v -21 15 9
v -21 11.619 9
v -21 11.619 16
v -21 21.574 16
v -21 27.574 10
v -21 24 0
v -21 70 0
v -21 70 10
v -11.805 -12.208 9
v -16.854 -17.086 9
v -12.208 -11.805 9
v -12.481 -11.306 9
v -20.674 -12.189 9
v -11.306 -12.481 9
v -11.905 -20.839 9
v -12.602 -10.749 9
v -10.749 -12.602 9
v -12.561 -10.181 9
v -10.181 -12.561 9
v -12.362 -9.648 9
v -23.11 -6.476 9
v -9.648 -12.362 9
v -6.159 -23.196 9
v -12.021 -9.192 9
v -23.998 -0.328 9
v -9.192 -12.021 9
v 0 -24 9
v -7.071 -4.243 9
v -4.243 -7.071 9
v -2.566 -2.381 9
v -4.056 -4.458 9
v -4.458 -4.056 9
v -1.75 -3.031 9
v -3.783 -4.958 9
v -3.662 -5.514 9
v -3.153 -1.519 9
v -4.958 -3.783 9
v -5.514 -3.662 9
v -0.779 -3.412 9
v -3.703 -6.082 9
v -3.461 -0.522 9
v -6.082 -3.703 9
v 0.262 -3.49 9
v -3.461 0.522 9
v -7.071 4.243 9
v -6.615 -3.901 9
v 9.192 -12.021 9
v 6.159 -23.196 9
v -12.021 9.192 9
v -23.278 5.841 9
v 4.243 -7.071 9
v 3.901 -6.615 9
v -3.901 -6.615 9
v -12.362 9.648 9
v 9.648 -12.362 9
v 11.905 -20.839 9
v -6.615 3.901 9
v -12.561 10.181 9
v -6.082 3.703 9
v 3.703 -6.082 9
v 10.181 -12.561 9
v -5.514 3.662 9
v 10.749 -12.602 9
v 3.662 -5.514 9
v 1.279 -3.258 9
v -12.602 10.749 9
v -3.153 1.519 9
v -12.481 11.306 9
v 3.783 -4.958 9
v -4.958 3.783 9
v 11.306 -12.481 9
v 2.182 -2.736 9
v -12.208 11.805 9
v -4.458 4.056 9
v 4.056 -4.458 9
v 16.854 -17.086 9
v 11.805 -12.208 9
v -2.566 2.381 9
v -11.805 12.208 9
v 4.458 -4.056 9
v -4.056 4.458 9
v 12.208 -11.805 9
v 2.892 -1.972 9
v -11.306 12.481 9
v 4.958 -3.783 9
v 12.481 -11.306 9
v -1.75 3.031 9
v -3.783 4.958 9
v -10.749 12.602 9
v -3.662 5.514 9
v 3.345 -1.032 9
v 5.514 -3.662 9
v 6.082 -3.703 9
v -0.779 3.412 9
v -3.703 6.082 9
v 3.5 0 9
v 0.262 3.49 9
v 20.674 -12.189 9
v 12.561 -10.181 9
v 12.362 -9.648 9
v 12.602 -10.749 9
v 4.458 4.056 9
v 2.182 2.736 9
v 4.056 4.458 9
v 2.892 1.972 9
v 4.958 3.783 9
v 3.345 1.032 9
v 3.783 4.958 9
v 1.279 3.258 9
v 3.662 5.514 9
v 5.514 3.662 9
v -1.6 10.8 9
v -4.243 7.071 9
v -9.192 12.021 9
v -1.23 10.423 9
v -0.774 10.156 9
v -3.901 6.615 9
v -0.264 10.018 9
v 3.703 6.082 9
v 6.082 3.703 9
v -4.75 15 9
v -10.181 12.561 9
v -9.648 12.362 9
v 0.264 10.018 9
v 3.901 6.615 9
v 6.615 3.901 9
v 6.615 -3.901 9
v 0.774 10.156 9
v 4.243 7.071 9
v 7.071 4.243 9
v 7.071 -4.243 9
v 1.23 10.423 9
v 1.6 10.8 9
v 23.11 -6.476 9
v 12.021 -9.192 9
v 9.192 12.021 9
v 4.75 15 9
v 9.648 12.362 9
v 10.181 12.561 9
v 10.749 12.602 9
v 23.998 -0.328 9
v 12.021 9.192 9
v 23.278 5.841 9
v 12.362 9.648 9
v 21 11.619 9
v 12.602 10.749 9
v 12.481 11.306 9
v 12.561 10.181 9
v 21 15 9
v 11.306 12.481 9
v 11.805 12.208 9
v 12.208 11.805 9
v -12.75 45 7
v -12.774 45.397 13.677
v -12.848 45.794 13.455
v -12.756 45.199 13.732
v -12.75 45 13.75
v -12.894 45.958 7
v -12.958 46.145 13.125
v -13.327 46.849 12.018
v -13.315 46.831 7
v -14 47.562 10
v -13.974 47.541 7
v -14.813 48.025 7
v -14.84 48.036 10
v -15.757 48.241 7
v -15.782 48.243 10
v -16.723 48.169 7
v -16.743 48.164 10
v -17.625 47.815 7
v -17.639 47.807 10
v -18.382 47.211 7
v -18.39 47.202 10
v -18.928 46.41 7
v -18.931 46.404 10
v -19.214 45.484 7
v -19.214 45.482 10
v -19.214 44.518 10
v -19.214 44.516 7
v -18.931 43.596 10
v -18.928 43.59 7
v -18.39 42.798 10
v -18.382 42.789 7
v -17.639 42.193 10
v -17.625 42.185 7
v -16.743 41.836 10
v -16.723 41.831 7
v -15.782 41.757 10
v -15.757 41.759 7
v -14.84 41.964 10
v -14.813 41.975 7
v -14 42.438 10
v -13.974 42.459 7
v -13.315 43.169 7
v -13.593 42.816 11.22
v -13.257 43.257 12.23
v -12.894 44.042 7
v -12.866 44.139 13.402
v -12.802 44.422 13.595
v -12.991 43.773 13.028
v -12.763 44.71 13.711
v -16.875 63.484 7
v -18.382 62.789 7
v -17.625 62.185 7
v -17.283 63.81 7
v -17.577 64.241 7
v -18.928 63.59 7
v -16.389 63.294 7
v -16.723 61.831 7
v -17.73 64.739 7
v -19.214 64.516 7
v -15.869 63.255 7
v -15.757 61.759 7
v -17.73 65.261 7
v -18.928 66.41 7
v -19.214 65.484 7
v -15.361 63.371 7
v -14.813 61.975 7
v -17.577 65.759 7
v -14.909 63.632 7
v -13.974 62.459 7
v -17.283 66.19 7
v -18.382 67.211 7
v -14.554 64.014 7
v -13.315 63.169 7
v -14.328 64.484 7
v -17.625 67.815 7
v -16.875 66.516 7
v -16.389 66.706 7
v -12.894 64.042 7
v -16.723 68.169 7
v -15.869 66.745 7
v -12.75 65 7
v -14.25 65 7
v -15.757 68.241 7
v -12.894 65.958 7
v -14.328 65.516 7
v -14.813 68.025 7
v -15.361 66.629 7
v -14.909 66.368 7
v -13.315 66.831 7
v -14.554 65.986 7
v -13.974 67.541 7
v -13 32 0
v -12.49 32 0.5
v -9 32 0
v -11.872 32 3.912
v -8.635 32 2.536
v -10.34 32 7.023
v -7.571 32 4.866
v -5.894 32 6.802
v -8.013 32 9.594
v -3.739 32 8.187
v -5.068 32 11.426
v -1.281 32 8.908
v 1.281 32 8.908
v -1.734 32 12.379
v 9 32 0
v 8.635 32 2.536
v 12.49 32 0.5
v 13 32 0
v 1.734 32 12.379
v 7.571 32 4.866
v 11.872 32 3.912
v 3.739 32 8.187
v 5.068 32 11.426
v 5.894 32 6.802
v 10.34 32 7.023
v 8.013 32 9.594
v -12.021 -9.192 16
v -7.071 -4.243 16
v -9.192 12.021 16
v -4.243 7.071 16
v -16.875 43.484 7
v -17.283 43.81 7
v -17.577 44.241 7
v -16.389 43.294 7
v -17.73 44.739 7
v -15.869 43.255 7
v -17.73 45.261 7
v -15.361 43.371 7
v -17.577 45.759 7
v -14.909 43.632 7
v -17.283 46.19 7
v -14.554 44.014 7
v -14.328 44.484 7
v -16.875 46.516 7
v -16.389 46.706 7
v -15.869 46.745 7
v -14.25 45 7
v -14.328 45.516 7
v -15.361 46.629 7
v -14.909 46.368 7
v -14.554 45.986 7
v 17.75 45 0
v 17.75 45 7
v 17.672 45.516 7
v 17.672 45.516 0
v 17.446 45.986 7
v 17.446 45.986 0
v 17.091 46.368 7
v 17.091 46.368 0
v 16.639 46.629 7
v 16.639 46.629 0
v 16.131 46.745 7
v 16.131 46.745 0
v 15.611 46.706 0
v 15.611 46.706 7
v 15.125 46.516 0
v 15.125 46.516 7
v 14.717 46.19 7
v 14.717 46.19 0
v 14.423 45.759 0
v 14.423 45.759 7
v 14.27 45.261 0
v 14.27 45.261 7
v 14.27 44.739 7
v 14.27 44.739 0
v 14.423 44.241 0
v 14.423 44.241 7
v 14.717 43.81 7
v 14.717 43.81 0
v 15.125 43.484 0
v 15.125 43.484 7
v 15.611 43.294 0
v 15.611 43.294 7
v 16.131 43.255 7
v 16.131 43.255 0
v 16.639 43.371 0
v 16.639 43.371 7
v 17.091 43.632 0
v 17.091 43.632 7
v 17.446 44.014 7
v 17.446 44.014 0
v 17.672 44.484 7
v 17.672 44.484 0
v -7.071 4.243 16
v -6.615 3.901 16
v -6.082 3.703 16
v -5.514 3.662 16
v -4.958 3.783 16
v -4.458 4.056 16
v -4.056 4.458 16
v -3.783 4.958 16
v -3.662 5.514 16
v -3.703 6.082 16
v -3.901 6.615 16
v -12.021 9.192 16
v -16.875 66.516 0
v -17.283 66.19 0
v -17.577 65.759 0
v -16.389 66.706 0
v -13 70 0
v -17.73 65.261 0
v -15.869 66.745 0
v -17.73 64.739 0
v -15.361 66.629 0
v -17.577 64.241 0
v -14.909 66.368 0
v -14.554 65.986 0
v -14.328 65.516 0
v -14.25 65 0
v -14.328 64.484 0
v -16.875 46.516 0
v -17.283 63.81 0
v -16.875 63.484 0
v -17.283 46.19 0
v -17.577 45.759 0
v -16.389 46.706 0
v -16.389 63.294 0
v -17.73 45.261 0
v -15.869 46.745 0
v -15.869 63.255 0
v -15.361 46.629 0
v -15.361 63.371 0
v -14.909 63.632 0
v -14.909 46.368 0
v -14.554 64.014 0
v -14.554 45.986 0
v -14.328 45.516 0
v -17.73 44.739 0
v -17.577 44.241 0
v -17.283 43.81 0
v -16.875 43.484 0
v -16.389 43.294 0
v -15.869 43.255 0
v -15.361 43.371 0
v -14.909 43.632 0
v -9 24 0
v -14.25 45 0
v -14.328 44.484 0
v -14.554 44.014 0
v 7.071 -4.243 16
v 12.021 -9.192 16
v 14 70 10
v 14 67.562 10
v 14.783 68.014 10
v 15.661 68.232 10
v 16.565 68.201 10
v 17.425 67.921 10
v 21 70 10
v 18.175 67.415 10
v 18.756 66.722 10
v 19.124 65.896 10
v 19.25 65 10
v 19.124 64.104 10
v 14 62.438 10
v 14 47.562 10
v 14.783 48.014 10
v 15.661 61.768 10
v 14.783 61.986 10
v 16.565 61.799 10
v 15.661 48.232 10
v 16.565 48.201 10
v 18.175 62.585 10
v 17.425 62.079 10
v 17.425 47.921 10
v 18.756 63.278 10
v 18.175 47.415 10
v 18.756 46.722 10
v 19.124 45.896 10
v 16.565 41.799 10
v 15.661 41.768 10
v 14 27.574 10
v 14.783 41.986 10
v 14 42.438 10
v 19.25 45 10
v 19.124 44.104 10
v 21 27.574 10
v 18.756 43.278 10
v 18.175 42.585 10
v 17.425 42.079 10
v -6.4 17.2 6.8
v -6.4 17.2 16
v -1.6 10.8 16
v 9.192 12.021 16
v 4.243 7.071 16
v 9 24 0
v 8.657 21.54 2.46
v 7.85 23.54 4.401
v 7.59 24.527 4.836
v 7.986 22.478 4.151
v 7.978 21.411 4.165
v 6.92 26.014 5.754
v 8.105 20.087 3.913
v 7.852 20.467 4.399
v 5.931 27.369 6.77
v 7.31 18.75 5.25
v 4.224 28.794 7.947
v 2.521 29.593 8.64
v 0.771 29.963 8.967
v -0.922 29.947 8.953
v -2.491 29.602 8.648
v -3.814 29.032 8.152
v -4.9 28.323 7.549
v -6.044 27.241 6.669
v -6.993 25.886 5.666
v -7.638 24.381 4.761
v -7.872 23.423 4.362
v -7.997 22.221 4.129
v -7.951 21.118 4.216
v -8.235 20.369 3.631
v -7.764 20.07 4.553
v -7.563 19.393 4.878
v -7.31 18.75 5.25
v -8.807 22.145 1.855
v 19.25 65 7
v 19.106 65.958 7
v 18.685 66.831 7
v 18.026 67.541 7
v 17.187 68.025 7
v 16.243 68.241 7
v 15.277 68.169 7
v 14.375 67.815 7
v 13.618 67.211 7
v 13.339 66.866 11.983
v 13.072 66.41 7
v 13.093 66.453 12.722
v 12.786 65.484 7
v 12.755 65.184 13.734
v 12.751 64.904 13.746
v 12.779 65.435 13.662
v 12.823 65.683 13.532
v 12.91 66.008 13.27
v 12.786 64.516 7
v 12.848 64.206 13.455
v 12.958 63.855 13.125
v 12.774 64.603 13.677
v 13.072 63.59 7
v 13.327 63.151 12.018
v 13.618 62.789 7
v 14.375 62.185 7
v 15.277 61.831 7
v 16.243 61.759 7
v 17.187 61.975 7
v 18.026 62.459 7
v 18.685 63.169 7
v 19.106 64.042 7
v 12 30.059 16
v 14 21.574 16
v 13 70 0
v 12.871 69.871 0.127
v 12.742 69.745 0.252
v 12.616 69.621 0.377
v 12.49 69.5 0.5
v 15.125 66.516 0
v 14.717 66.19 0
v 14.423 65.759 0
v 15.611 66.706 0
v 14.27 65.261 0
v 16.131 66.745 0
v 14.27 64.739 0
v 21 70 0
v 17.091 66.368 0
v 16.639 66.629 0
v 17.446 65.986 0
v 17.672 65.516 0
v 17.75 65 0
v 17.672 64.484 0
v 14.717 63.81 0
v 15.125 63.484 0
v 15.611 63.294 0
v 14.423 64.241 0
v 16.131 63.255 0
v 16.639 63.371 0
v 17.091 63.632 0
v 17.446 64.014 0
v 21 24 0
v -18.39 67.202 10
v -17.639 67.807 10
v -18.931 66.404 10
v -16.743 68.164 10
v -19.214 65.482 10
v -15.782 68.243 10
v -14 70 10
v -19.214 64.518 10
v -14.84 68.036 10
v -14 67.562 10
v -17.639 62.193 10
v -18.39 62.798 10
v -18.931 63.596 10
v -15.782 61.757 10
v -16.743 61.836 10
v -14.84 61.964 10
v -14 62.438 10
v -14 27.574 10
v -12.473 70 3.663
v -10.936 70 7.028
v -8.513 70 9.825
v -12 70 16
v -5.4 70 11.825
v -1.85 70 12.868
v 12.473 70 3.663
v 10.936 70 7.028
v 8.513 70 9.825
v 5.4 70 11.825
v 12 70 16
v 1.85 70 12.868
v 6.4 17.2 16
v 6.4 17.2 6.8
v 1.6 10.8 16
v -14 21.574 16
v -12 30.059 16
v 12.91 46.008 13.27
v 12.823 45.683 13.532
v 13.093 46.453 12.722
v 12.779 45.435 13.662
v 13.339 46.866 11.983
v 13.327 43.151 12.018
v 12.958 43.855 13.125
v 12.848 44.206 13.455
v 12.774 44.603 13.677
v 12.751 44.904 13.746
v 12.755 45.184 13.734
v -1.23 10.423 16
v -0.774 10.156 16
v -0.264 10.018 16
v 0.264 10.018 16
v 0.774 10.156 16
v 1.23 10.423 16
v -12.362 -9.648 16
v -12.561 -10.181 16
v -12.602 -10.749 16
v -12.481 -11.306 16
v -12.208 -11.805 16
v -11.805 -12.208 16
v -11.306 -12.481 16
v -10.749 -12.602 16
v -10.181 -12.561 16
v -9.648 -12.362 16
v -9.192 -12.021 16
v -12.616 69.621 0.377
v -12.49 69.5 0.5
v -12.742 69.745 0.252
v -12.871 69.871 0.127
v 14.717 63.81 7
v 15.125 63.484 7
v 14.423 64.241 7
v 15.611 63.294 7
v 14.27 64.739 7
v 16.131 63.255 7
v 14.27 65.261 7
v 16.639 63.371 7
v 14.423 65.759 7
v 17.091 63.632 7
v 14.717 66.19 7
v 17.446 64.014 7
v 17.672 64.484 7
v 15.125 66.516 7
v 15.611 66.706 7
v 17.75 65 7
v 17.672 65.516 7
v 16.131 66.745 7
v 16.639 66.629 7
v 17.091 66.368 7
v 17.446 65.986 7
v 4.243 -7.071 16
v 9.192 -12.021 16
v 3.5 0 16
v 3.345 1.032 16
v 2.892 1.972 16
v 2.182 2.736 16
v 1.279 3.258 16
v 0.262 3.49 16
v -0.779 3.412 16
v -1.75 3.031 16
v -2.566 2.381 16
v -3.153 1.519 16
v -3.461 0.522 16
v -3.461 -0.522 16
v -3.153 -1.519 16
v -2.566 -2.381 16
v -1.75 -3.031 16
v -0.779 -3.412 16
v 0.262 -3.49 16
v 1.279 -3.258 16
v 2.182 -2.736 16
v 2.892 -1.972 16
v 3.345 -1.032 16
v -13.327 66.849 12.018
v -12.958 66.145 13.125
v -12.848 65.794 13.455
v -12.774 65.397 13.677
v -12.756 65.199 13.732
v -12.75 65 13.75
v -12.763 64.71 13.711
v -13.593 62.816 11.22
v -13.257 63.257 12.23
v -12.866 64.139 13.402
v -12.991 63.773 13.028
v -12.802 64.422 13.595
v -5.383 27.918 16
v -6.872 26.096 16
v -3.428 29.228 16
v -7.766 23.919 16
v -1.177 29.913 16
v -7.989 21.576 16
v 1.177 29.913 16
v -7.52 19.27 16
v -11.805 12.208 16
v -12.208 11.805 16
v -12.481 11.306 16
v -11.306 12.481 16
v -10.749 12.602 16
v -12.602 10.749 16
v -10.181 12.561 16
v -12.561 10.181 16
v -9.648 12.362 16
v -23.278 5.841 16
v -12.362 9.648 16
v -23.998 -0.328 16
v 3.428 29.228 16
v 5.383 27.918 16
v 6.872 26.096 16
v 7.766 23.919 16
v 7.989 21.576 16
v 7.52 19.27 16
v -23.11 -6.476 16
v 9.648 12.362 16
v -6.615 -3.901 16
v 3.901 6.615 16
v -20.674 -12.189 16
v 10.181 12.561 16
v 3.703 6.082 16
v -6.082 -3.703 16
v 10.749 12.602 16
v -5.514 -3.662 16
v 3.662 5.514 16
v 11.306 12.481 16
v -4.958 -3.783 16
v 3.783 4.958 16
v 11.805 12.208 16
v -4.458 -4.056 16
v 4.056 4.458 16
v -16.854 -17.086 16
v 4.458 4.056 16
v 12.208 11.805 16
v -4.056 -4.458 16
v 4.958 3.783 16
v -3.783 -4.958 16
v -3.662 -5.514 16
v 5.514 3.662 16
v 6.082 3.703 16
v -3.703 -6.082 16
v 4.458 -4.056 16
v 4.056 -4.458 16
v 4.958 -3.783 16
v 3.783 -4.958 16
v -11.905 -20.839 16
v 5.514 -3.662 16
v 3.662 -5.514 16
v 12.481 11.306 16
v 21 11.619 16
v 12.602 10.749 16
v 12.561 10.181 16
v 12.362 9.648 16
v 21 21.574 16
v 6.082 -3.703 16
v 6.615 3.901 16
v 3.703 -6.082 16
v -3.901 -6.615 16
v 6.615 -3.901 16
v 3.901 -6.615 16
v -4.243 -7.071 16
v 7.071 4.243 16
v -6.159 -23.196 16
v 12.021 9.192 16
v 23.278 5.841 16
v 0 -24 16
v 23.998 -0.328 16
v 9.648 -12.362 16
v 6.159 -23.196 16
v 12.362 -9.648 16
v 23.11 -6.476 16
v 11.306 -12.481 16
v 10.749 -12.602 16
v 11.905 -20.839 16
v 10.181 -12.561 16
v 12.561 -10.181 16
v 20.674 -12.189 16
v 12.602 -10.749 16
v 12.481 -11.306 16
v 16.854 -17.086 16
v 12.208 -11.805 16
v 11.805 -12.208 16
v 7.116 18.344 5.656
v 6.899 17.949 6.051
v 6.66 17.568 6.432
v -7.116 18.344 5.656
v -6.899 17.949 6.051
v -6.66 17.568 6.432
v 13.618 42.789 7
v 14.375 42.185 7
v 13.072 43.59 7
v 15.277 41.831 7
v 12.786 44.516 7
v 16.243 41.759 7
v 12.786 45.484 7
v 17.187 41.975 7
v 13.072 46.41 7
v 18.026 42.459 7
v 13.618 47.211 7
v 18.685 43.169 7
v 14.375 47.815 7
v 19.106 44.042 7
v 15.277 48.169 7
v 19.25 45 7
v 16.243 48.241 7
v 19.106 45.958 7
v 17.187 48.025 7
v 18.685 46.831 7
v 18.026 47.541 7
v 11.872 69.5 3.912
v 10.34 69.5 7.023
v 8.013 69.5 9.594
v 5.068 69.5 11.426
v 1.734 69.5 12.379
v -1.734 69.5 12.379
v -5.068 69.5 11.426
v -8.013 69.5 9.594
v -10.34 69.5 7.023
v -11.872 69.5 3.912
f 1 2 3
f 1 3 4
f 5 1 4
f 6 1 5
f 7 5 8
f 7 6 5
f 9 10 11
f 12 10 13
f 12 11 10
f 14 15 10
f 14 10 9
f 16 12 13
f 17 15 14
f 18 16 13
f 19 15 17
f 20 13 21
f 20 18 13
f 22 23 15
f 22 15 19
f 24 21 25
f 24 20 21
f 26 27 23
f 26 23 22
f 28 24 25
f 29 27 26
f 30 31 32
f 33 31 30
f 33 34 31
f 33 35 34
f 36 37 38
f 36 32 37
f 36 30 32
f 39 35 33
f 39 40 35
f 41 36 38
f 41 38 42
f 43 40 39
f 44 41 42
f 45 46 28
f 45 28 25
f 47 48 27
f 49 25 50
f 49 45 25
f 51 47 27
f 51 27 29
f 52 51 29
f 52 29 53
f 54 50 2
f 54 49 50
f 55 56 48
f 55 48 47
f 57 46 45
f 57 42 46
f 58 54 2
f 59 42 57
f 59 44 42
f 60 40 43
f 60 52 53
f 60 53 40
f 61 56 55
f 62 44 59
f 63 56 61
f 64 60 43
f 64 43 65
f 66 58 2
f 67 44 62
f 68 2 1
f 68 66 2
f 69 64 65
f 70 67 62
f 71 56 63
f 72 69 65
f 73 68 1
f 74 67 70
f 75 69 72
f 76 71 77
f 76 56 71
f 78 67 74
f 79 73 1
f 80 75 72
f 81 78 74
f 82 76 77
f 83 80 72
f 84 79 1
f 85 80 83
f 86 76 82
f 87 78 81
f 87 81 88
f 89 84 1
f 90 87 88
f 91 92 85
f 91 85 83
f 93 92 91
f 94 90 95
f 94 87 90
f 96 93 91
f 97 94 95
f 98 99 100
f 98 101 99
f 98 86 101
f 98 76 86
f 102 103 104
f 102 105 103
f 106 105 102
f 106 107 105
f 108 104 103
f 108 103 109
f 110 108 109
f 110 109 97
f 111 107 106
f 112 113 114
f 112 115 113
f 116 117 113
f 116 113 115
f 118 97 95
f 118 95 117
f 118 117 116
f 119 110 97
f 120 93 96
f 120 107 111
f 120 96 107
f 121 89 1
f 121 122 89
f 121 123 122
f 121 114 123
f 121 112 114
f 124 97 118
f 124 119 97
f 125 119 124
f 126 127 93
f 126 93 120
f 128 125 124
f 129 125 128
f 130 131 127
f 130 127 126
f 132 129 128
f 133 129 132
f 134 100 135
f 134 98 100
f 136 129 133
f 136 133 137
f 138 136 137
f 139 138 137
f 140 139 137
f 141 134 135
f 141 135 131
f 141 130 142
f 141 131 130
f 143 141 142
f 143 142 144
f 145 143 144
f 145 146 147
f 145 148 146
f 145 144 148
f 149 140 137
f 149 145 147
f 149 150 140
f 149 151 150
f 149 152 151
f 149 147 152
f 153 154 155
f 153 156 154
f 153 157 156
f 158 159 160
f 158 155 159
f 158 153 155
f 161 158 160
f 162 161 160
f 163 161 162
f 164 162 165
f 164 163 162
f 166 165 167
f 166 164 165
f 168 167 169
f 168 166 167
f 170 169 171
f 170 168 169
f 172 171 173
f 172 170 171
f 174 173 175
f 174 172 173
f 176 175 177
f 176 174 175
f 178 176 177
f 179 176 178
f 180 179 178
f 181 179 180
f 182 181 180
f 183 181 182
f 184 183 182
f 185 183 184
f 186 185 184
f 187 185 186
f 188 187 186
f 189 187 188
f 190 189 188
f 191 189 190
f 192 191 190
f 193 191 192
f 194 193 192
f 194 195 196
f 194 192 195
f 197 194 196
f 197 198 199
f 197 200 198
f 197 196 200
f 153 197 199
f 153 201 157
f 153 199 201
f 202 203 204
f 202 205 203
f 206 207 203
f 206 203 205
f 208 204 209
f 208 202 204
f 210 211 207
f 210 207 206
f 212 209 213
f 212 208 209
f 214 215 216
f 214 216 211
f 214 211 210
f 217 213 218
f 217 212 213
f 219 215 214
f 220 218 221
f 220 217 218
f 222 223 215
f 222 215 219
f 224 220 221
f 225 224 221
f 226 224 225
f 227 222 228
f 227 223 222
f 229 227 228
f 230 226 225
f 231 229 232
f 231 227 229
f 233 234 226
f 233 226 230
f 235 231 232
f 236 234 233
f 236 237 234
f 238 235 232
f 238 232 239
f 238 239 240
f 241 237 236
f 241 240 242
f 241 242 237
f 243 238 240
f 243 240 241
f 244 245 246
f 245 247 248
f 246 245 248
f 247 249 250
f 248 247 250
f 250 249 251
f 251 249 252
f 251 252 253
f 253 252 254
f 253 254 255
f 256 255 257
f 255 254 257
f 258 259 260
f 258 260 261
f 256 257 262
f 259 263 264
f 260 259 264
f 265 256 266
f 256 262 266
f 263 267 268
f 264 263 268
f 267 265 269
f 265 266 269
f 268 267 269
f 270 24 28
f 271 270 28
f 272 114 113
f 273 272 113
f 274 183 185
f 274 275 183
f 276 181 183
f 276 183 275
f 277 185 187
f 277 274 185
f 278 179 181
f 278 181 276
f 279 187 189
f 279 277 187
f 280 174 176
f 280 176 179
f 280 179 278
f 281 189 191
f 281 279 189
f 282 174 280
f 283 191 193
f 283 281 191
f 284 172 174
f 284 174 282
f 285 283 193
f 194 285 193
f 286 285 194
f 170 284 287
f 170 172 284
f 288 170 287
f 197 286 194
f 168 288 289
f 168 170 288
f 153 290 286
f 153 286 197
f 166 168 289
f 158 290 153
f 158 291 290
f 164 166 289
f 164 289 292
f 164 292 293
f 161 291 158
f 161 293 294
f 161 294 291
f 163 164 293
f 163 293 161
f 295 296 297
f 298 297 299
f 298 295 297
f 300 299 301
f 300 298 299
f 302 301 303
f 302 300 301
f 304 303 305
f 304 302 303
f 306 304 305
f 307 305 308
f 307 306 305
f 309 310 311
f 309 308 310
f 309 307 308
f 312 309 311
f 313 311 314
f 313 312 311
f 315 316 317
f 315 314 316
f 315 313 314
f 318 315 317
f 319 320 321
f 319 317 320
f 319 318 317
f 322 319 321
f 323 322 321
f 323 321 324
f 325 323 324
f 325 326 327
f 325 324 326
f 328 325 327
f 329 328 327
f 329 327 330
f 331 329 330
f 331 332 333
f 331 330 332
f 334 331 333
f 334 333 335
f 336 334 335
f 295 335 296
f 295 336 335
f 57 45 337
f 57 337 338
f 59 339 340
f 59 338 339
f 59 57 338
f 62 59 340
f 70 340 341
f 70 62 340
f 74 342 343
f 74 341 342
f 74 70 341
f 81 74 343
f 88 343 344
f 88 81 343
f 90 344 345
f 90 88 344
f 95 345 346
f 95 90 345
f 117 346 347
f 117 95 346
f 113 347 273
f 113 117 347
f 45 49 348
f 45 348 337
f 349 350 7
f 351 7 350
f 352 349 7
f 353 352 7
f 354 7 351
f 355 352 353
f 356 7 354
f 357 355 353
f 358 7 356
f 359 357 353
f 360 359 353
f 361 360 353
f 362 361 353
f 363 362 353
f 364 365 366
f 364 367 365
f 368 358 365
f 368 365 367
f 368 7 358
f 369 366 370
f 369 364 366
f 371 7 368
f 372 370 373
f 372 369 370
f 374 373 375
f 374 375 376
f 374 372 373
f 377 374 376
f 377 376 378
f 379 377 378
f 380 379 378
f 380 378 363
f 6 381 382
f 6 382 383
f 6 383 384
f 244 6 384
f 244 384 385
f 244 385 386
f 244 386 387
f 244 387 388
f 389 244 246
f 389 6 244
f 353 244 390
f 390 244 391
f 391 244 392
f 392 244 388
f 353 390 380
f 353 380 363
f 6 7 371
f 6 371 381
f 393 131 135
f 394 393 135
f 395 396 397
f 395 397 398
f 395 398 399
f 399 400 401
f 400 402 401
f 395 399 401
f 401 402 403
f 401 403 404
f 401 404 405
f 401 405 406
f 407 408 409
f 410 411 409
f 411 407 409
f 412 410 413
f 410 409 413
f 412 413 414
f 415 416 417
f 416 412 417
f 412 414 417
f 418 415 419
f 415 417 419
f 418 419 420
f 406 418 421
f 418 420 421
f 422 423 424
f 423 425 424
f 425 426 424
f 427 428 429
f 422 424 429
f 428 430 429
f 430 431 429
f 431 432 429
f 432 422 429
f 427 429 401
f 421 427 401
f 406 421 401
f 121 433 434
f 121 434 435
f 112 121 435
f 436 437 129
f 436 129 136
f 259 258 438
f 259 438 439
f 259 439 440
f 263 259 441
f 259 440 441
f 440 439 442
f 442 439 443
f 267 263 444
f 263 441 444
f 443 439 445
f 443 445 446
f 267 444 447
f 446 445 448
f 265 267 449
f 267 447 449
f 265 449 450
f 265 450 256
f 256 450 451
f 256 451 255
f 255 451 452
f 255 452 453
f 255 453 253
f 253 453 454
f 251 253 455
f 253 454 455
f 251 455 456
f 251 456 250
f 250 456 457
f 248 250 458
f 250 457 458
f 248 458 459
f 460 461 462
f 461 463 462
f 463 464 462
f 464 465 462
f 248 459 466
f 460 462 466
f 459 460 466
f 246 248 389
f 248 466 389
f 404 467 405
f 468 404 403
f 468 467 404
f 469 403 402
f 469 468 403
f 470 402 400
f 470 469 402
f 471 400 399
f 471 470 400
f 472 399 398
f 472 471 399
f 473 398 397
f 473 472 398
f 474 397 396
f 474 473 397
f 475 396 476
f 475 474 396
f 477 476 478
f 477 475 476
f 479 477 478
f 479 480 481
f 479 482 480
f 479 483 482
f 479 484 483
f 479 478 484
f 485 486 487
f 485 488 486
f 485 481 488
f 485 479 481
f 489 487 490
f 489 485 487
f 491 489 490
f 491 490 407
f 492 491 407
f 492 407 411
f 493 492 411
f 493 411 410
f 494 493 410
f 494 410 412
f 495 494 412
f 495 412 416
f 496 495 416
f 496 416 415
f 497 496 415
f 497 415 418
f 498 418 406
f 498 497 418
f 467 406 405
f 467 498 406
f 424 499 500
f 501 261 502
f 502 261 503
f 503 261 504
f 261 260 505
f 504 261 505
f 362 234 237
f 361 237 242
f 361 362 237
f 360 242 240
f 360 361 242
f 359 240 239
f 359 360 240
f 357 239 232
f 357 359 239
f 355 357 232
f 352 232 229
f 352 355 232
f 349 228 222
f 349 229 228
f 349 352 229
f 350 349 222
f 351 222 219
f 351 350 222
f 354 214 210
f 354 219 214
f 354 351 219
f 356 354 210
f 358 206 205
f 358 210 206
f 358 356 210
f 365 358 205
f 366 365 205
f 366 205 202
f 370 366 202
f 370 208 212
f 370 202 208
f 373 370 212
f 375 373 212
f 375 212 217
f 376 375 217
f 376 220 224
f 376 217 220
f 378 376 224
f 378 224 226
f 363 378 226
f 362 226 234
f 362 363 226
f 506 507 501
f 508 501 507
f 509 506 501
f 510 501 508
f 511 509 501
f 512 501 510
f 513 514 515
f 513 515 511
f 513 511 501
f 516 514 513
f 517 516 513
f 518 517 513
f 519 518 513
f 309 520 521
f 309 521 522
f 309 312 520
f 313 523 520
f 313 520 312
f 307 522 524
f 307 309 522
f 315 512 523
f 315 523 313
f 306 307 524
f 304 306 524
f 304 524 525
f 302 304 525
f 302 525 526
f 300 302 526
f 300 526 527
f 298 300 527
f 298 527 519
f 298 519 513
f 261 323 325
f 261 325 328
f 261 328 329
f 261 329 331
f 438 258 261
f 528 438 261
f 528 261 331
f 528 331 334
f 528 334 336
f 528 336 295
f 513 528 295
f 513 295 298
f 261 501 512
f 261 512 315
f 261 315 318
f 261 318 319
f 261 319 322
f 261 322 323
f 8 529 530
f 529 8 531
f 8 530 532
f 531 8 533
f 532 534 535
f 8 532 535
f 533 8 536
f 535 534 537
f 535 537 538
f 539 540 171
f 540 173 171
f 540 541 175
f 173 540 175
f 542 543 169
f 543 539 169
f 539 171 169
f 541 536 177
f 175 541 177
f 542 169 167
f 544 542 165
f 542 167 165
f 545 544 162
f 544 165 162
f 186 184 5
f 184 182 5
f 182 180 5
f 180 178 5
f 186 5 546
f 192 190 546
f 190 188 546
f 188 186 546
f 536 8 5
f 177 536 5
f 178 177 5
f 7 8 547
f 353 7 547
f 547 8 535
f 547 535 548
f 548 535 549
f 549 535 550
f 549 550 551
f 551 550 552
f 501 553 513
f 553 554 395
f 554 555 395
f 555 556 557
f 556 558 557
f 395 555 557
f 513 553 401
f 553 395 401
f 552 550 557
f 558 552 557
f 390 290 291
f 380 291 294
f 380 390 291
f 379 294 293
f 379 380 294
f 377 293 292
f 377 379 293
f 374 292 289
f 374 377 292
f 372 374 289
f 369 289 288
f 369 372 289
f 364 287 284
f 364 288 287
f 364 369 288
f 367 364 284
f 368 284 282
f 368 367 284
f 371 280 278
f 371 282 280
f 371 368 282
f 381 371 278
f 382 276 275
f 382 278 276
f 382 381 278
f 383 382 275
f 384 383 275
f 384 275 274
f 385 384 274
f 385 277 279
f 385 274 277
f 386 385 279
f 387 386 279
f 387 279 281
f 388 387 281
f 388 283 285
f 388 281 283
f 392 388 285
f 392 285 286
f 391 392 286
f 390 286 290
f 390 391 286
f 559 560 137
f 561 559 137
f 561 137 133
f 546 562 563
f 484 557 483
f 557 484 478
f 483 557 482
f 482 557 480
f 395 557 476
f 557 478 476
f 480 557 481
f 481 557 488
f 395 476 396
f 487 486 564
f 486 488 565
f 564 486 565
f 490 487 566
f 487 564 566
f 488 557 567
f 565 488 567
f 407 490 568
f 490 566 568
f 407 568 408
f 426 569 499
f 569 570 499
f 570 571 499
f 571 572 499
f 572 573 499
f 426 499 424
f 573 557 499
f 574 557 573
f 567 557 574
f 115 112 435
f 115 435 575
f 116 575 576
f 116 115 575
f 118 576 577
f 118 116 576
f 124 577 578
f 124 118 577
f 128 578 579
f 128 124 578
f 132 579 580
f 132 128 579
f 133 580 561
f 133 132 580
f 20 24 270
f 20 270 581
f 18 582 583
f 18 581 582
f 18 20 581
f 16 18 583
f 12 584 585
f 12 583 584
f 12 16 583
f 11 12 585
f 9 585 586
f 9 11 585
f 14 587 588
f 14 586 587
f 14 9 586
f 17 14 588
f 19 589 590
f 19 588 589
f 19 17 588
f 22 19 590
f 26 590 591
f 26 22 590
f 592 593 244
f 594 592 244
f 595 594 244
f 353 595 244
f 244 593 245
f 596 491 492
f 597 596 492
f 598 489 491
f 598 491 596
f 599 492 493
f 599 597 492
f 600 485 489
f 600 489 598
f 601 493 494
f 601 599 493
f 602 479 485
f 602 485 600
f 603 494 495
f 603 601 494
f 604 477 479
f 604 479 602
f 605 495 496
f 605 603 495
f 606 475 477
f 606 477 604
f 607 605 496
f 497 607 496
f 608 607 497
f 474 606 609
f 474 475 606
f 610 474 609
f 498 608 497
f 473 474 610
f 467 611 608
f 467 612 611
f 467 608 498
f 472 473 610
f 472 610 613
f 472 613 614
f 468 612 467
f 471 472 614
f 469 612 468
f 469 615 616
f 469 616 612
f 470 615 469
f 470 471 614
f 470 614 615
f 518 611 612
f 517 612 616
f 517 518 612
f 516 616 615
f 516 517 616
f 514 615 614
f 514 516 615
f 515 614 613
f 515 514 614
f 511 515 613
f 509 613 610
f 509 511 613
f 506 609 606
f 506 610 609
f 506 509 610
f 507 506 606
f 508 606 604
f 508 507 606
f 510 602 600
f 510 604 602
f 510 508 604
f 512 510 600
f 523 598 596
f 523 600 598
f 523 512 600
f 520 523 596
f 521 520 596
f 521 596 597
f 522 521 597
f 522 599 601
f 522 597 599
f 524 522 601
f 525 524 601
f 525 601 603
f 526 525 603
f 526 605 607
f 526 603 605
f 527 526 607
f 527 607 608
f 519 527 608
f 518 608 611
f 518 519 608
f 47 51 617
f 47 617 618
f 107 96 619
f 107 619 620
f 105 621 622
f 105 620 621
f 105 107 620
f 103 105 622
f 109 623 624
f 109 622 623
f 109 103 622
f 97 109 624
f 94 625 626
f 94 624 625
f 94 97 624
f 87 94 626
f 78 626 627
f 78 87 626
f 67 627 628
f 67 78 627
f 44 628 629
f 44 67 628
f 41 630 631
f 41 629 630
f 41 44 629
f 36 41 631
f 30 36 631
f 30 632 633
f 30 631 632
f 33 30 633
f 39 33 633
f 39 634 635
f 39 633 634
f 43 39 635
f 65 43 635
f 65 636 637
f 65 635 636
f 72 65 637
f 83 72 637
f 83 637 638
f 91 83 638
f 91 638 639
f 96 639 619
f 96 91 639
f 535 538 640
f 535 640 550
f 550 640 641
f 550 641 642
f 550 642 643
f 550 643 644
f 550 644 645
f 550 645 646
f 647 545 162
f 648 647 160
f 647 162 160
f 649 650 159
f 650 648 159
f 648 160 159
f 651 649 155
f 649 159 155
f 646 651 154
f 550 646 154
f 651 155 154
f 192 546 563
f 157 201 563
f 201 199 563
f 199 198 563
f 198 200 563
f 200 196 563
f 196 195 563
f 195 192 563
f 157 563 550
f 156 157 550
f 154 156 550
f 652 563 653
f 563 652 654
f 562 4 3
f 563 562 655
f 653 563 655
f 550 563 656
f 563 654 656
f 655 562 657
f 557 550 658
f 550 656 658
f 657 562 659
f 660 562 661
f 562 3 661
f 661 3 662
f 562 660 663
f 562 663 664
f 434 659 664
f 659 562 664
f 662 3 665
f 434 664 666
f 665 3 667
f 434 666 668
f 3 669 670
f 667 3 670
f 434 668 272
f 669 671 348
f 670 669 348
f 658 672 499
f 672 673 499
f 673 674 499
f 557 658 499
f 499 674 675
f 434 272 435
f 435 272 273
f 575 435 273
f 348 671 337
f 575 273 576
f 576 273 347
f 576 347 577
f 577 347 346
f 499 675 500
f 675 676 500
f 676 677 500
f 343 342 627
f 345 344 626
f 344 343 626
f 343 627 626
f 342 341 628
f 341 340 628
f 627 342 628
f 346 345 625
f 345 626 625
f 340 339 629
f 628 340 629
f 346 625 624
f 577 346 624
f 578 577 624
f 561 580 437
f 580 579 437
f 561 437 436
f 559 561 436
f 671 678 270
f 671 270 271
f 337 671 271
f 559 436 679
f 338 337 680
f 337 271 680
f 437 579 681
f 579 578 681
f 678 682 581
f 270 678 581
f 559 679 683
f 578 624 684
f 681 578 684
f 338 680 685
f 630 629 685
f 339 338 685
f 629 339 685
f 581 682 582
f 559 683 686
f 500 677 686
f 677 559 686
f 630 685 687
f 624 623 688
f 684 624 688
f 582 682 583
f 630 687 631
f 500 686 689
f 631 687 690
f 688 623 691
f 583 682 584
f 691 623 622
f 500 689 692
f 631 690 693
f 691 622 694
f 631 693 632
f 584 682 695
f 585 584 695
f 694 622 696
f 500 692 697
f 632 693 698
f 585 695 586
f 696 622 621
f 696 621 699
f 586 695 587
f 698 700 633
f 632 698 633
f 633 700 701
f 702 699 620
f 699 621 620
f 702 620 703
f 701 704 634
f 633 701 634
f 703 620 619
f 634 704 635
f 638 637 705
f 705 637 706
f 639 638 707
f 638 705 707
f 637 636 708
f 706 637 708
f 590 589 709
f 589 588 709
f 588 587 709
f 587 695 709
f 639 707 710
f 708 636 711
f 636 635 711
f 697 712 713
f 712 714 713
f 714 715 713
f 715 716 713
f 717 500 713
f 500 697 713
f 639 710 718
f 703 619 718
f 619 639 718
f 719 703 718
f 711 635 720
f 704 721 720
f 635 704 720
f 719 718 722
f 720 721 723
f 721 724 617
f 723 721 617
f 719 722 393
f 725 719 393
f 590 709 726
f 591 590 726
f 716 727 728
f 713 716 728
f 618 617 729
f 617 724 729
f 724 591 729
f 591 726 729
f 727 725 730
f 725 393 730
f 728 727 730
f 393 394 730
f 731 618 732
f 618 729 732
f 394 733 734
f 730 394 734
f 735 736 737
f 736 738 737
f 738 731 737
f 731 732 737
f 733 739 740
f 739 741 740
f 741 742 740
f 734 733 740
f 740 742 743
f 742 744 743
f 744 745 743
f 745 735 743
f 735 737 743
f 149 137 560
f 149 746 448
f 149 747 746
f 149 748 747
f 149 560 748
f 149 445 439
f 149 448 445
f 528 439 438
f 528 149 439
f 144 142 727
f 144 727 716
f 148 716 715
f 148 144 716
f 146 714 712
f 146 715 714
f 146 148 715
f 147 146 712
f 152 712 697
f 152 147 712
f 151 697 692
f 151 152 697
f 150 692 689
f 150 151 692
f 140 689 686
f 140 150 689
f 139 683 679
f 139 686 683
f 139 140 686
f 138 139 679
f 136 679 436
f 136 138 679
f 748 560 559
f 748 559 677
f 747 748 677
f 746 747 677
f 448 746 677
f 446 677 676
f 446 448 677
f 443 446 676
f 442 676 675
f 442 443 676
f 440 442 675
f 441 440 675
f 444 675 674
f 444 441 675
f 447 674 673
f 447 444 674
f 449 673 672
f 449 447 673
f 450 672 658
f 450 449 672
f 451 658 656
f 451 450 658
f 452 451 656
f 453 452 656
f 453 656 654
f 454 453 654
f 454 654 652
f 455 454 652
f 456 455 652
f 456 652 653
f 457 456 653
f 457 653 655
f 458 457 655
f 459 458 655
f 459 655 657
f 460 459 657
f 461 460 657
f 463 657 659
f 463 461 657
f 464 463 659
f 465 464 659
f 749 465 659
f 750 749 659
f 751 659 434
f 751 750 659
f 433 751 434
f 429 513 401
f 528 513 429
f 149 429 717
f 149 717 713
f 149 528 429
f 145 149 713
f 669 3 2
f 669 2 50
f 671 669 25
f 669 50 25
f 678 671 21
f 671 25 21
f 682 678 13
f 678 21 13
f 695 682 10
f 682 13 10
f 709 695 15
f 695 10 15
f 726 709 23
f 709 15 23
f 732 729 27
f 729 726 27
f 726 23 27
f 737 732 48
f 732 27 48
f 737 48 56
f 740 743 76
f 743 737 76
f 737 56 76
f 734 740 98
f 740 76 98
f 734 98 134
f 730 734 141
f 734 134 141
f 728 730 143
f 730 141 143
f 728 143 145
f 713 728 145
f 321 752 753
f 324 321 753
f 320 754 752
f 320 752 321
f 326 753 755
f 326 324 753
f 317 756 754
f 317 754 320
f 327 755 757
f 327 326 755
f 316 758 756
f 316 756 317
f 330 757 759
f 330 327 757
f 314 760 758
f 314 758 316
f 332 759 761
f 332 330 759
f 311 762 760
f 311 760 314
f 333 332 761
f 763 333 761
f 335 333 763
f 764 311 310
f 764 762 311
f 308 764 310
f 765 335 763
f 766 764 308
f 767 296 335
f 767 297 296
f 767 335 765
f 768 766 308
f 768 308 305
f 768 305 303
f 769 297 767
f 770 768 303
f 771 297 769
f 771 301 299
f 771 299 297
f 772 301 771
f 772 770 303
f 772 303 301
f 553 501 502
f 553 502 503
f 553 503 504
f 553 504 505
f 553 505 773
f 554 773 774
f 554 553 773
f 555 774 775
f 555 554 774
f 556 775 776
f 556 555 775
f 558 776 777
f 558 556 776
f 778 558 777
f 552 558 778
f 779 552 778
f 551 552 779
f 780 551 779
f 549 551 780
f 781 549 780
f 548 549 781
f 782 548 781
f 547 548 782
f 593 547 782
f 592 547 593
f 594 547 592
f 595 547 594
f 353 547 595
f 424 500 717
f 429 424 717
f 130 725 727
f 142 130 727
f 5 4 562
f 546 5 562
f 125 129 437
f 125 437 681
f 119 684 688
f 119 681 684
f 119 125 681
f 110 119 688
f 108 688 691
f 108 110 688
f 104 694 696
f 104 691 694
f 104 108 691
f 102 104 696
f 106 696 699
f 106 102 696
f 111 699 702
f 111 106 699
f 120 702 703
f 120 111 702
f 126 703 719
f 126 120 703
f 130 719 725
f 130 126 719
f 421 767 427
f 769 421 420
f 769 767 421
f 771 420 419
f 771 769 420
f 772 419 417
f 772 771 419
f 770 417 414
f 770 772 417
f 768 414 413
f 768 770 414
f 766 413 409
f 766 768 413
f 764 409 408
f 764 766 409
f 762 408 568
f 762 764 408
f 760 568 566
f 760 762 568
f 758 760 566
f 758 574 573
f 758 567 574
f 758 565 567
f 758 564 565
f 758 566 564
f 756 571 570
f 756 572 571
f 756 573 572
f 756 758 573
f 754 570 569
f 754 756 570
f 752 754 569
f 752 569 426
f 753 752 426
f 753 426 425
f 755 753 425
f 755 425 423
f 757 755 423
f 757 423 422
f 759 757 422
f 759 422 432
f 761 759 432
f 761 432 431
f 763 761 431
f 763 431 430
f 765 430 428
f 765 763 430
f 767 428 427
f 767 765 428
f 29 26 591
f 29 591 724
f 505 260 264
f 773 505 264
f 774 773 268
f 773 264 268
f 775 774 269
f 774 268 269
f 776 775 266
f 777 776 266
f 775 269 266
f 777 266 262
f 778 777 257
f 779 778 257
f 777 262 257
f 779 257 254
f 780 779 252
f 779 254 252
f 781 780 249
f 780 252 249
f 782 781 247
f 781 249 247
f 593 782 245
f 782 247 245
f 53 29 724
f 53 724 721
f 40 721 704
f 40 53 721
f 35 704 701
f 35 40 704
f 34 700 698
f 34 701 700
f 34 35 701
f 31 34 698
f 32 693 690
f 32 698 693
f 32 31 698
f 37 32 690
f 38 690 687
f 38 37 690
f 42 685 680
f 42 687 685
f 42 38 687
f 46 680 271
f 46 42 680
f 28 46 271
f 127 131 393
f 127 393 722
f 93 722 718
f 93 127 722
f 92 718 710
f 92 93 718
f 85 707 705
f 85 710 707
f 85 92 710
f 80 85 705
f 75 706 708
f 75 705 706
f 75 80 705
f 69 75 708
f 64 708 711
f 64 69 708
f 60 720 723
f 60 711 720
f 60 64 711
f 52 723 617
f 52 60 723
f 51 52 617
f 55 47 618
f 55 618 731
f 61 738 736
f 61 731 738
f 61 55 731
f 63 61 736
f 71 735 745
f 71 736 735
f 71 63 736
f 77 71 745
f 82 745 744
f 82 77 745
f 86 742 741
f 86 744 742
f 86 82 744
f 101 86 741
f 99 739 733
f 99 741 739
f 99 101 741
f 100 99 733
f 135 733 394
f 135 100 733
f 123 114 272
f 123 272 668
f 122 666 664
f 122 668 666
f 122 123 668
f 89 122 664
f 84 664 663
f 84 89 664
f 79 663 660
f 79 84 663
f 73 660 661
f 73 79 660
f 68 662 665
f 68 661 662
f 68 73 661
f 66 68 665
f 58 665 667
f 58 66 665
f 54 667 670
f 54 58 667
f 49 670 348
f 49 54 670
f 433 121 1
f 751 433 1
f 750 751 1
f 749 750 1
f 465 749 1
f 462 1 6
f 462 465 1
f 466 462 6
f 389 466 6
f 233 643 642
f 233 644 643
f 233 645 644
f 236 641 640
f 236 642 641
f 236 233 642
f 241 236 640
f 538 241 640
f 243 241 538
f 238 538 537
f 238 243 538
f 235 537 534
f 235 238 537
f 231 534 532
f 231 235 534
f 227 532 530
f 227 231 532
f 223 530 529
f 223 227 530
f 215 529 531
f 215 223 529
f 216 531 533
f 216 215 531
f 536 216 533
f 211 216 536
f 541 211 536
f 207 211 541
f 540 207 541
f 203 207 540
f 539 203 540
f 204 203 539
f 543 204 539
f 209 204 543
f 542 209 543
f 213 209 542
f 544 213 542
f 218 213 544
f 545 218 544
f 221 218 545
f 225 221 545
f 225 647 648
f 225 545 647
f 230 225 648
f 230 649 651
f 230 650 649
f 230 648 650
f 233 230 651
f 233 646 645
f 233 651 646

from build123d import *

# Parameters (mm, degrees)
SKETCH007_R                          = 3.25
EXTRUDE006_DEPTH                     = 10
SKETCH006_AS_DRAWN_R                 = 9
EXTRUDE005_DEPTH                     = 27
EXTRUDE005_ONTO_SKETCH006_ROLL_ANGLE = 90
SKETCH_R                             = 3.5
SKETCH_R_2                           = 1.75
EXTRUDE_DEPTH                        = 30
SKETCH001_AS_DRAWN_R                 = 12.5
EXTRUDE004_DEPTH                     = 50
EXTRUDE004_ONTO_SKETCH001_ROLL_ANGLE = 90
EXTRUDE002_DEPTH                     = 60
SKETCH003_AS_DRAWN_W                 = 50
SKETCH003_AS_DRAWN_H                 = 16
EXTRUDE003_DEPTH                     = 98
EXTRUDE003_ONTO_SKETCH003_ROLL_ANGLE = 90
CHAMFER_SIZE                         = 0.5


with BuildPart() as extrude006:
    # Sketch007 → Extrude006 (new body)
    with BuildSketch(Plane.XY):
        with Locations((-16, 45)):
            Circle(SKETCH007_R)
        with Locations((16, 45)):
            Circle(SKETCH007_R)
        with Locations((-16, 65)):
            Circle(SKETCH007_R)
        with Locations((16, 65)):
            Circle(SKETCH007_R)
    extrude(amount=EXTRUDE006_DEPTH)


with BuildPart() as extrude006_1:
    # Extrude006 placement: moved
    add(extrude006.part.moved(Location((0, 0, 7))))


with BuildPart() as extrude005:
    # Sketch006 as drawn → Extrude005 (new)
    with BuildSketch(Plane.XY):
        Circle(SKETCH006_AS_DRAWN_R)
    extrude(amount=-EXTRUDE005_DEPTH)


with BuildPart() as extrude005_1:
    # Extrude005 onto Sketch006 roll: moved
    add(extrude005.part.rotate(Axis((0, 0, 0), (1, 0, 0)), EXTRUDE005_ONTO_SKETCH006_ROLL_ANGLE))


with BuildPart() as extrude005_2:
    # Extrude005 onto Sketch006 placement: moved
    add(extrude005_1.part.moved(Location((0, 33, 0))))


with BuildPart() as extrude005_3:
    # Extrude005 placement: moved
    add(extrude005_2.part.moved(Location((0, -18, 0))))


with BuildPart() as sweep_body:
    # Sweep: sweep along a path in Sketch005
    with BuildLine(Plane.YZ) as sweep_path:
        Line((70, 40), (40, 40))
        Line((40, 40), (32.928932, 47.071068))
    # Sketch004 → Sweep (sweep)
    with BuildSketch(Plane.XZ.offset(-70)):
        Polygon((-12, 16), (12, 16), (14, 10), (21, 10), (21, 28), (-21, 28), (-21, 10), (-14, 10), align=None)
    sweep(path=sweep_path.line, transition=Transition.RIGHT)


with BuildPart() as extrude_body:
    # Sketch → Extrude (new body)
    with BuildSketch(Plane.XY):
        Circle(SKETCH_R)
        with Locations((-16, 45)):
            Circle(SKETCH_R_2)
        with Locations((-16, 65)):
            Circle(SKETCH_R_2)
        with Locations((16, 65)):
            Circle(SKETCH_R_2)
        with Locations((16, 45)):
            Circle(SKETCH_R_2)
        with BuildLine():
            ThreePointArc((-12.020815, -9.192388), (-12.020815, -12.020815), (-9.192388, -12.020815))
            Line((-9.192388, -12.020815), (-4.242641, -7.071068))
            ThreePointArc((-4.242641, -7.071068), (-4.242641, -4.242641), (-7.071068, -4.242641))
            Line((-12.020815, -9.192388), (-7.071068, -4.242641))
        make_face()
        with BuildLine():
            ThreePointArc((7.071068, -4.242641), (4.242641, -4.242641), (4.242641, -7.071068))
            Line((4.242641, -7.071068), (9.192388, -12.020815))
            ThreePointArc((9.192388, -12.020815), (12.020815, -12.020815), (12.020815, -9.192388))
            Line((7.071068, -4.242641), (12.020815, -9.192388))
        make_face()
        with BuildLine():
            ThreePointArc((4.242641, 7.071068), (4.242641, 4.242641), (7.071068, 4.242641))
            Line((7.071068, 4.242641), (12.020815, 9.192388))
            ThreePointArc((12.020815, 9.192388), (12.020815, 12.020815), (9.192388, 12.020815))
            Line((4.242641, 7.071068), (9.192388, 12.020815))
        make_face()
        with BuildLine():
            ThreePointArc((-9.192388, 12.020815), (-12.020815, 12.020815), (-12.020815, 9.192388))
            Line((-12.020815, 9.192388), (-7.071068, 4.242641))
            ThreePointArc((-7.071068, 4.242641), (-4.242641, 4.242641), (-4.242641, 7.071068))
            Line((-9.192388, 12.020815), (-4.242641, 7.071068))
        make_face()
        with BuildLine():
            ThreePointArc((6.4, 17.2), (0, 30), (-6.4, 17.2))
            Line((-6.4, 17.2), (-1.6, 10.8))
            ThreePointArc((-1.6, 10.8), (0, 10), (1.6, 10.8))
            Line((6.4, 17.2), (1.6, 10.8))
        make_face()
        with BuildLine():
            ThreePointArc((-21, 11.61895), (0, -24), (21, 11.61895))
            Line((21, 70), (21, 11.61895))
            Line((30, 70), (21, 70))
            Line((30, -30), (30, 70))
            Line((-30, -30), (30, -30))
            Line((-30, 70), (-30, -30))
            Line((-21, 70), (-30, 70))
            Line((-21, 11.61895), (-21, 70))
        make_face()
    extrude(amount=EXTRUDE_DEPTH)


with BuildPart() as extrude004:
    # Sketch001 as drawn → Extrude004 (new)
    with BuildSketch(Plane.XY):
        Circle(SKETCH001_AS_DRAWN_R)
    extrude(amount=-EXTRUDE004_DEPTH)


with BuildPart() as extrude004_1:
    # Extrude004 onto Sketch001 roll: moved
    add(extrude004.part.rotate(Axis((0, 0, 0), (1, 0, 0)), EXTRUDE004_ONTO_SKETCH001_ROLL_ANGLE))


with BuildPart() as extrude004_2:
    # Extrude004 onto Sketch001 placement: moved
    add(extrude004_1.part.moved(Location((0, 32, 0))))


with BuildPart() as extrude002:
    # Sketch002 → Extrude002 (new body)
    with BuildSketch(Plane.YZ.offset(33)):
        Polygon((-30, 9), (15, 9), (24, 0), (-30, 0), align=None)
    extrude(amount=-EXTRUDE002_DEPTH)


with BuildPart() as chamfer_body:
    # Sketch003 as drawn → Extrude003 (new)
    with BuildSketch(Plane.XY):
        with Locations((0, 8)):
            Rectangle(SKETCH003_AS_DRAWN_W, SKETCH003_AS_DRAWN_H)
    extrude(amount=-EXTRUDE003_DEPTH)


with BuildPart() as chamfer_body_1:
    # Extrude003 onto Sketch003 roll: moved
    add(chamfer_body.part.rotate(Axis((0, 0, 0), (1, 0, 0)), EXTRUDE003_ONTO_SKETCH003_ROLL_ANGLE))


with BuildPart() as chamfer_body_2:
    # Extrude003 onto Sketch003 placement: moved
    add(chamfer_body_1.part.moved(Location((0, -28, 0))))

    # Cut: cut Extrude002
    add(extrude002.part, mode=Mode.SUBTRACT)

    # Cut001: cut Extrude004
    add(extrude004_2.part, mode=Mode.SUBTRACT)

    # Cut002: cut Extrude body
    add(extrude_body.part, mode=Mode.SUBTRACT)

    # Cut003: cut Sweep body
    add(sweep_body.part, mode=Mode.SUBTRACT)

    # Cut004: cut Extrude005
    add(extrude005_3.part, mode=Mode.SUBTRACT)

    # Cut005: cut Extrude006
    add(extrude006_1.part, mode=Mode.SUBTRACT)

    # Chamfer
    chamfer_edges = [chamfer_body_2.edges().sort_by_distance(p)[0] for p in [
        (12.5, 51, 0),
        (0, 70, 12.5),
        (-12.5, 51, 0),
    ]]
    chamfer(chamfer_edges, length=CHAMFER_SIZE)


solid = chamfer_body_2.part
